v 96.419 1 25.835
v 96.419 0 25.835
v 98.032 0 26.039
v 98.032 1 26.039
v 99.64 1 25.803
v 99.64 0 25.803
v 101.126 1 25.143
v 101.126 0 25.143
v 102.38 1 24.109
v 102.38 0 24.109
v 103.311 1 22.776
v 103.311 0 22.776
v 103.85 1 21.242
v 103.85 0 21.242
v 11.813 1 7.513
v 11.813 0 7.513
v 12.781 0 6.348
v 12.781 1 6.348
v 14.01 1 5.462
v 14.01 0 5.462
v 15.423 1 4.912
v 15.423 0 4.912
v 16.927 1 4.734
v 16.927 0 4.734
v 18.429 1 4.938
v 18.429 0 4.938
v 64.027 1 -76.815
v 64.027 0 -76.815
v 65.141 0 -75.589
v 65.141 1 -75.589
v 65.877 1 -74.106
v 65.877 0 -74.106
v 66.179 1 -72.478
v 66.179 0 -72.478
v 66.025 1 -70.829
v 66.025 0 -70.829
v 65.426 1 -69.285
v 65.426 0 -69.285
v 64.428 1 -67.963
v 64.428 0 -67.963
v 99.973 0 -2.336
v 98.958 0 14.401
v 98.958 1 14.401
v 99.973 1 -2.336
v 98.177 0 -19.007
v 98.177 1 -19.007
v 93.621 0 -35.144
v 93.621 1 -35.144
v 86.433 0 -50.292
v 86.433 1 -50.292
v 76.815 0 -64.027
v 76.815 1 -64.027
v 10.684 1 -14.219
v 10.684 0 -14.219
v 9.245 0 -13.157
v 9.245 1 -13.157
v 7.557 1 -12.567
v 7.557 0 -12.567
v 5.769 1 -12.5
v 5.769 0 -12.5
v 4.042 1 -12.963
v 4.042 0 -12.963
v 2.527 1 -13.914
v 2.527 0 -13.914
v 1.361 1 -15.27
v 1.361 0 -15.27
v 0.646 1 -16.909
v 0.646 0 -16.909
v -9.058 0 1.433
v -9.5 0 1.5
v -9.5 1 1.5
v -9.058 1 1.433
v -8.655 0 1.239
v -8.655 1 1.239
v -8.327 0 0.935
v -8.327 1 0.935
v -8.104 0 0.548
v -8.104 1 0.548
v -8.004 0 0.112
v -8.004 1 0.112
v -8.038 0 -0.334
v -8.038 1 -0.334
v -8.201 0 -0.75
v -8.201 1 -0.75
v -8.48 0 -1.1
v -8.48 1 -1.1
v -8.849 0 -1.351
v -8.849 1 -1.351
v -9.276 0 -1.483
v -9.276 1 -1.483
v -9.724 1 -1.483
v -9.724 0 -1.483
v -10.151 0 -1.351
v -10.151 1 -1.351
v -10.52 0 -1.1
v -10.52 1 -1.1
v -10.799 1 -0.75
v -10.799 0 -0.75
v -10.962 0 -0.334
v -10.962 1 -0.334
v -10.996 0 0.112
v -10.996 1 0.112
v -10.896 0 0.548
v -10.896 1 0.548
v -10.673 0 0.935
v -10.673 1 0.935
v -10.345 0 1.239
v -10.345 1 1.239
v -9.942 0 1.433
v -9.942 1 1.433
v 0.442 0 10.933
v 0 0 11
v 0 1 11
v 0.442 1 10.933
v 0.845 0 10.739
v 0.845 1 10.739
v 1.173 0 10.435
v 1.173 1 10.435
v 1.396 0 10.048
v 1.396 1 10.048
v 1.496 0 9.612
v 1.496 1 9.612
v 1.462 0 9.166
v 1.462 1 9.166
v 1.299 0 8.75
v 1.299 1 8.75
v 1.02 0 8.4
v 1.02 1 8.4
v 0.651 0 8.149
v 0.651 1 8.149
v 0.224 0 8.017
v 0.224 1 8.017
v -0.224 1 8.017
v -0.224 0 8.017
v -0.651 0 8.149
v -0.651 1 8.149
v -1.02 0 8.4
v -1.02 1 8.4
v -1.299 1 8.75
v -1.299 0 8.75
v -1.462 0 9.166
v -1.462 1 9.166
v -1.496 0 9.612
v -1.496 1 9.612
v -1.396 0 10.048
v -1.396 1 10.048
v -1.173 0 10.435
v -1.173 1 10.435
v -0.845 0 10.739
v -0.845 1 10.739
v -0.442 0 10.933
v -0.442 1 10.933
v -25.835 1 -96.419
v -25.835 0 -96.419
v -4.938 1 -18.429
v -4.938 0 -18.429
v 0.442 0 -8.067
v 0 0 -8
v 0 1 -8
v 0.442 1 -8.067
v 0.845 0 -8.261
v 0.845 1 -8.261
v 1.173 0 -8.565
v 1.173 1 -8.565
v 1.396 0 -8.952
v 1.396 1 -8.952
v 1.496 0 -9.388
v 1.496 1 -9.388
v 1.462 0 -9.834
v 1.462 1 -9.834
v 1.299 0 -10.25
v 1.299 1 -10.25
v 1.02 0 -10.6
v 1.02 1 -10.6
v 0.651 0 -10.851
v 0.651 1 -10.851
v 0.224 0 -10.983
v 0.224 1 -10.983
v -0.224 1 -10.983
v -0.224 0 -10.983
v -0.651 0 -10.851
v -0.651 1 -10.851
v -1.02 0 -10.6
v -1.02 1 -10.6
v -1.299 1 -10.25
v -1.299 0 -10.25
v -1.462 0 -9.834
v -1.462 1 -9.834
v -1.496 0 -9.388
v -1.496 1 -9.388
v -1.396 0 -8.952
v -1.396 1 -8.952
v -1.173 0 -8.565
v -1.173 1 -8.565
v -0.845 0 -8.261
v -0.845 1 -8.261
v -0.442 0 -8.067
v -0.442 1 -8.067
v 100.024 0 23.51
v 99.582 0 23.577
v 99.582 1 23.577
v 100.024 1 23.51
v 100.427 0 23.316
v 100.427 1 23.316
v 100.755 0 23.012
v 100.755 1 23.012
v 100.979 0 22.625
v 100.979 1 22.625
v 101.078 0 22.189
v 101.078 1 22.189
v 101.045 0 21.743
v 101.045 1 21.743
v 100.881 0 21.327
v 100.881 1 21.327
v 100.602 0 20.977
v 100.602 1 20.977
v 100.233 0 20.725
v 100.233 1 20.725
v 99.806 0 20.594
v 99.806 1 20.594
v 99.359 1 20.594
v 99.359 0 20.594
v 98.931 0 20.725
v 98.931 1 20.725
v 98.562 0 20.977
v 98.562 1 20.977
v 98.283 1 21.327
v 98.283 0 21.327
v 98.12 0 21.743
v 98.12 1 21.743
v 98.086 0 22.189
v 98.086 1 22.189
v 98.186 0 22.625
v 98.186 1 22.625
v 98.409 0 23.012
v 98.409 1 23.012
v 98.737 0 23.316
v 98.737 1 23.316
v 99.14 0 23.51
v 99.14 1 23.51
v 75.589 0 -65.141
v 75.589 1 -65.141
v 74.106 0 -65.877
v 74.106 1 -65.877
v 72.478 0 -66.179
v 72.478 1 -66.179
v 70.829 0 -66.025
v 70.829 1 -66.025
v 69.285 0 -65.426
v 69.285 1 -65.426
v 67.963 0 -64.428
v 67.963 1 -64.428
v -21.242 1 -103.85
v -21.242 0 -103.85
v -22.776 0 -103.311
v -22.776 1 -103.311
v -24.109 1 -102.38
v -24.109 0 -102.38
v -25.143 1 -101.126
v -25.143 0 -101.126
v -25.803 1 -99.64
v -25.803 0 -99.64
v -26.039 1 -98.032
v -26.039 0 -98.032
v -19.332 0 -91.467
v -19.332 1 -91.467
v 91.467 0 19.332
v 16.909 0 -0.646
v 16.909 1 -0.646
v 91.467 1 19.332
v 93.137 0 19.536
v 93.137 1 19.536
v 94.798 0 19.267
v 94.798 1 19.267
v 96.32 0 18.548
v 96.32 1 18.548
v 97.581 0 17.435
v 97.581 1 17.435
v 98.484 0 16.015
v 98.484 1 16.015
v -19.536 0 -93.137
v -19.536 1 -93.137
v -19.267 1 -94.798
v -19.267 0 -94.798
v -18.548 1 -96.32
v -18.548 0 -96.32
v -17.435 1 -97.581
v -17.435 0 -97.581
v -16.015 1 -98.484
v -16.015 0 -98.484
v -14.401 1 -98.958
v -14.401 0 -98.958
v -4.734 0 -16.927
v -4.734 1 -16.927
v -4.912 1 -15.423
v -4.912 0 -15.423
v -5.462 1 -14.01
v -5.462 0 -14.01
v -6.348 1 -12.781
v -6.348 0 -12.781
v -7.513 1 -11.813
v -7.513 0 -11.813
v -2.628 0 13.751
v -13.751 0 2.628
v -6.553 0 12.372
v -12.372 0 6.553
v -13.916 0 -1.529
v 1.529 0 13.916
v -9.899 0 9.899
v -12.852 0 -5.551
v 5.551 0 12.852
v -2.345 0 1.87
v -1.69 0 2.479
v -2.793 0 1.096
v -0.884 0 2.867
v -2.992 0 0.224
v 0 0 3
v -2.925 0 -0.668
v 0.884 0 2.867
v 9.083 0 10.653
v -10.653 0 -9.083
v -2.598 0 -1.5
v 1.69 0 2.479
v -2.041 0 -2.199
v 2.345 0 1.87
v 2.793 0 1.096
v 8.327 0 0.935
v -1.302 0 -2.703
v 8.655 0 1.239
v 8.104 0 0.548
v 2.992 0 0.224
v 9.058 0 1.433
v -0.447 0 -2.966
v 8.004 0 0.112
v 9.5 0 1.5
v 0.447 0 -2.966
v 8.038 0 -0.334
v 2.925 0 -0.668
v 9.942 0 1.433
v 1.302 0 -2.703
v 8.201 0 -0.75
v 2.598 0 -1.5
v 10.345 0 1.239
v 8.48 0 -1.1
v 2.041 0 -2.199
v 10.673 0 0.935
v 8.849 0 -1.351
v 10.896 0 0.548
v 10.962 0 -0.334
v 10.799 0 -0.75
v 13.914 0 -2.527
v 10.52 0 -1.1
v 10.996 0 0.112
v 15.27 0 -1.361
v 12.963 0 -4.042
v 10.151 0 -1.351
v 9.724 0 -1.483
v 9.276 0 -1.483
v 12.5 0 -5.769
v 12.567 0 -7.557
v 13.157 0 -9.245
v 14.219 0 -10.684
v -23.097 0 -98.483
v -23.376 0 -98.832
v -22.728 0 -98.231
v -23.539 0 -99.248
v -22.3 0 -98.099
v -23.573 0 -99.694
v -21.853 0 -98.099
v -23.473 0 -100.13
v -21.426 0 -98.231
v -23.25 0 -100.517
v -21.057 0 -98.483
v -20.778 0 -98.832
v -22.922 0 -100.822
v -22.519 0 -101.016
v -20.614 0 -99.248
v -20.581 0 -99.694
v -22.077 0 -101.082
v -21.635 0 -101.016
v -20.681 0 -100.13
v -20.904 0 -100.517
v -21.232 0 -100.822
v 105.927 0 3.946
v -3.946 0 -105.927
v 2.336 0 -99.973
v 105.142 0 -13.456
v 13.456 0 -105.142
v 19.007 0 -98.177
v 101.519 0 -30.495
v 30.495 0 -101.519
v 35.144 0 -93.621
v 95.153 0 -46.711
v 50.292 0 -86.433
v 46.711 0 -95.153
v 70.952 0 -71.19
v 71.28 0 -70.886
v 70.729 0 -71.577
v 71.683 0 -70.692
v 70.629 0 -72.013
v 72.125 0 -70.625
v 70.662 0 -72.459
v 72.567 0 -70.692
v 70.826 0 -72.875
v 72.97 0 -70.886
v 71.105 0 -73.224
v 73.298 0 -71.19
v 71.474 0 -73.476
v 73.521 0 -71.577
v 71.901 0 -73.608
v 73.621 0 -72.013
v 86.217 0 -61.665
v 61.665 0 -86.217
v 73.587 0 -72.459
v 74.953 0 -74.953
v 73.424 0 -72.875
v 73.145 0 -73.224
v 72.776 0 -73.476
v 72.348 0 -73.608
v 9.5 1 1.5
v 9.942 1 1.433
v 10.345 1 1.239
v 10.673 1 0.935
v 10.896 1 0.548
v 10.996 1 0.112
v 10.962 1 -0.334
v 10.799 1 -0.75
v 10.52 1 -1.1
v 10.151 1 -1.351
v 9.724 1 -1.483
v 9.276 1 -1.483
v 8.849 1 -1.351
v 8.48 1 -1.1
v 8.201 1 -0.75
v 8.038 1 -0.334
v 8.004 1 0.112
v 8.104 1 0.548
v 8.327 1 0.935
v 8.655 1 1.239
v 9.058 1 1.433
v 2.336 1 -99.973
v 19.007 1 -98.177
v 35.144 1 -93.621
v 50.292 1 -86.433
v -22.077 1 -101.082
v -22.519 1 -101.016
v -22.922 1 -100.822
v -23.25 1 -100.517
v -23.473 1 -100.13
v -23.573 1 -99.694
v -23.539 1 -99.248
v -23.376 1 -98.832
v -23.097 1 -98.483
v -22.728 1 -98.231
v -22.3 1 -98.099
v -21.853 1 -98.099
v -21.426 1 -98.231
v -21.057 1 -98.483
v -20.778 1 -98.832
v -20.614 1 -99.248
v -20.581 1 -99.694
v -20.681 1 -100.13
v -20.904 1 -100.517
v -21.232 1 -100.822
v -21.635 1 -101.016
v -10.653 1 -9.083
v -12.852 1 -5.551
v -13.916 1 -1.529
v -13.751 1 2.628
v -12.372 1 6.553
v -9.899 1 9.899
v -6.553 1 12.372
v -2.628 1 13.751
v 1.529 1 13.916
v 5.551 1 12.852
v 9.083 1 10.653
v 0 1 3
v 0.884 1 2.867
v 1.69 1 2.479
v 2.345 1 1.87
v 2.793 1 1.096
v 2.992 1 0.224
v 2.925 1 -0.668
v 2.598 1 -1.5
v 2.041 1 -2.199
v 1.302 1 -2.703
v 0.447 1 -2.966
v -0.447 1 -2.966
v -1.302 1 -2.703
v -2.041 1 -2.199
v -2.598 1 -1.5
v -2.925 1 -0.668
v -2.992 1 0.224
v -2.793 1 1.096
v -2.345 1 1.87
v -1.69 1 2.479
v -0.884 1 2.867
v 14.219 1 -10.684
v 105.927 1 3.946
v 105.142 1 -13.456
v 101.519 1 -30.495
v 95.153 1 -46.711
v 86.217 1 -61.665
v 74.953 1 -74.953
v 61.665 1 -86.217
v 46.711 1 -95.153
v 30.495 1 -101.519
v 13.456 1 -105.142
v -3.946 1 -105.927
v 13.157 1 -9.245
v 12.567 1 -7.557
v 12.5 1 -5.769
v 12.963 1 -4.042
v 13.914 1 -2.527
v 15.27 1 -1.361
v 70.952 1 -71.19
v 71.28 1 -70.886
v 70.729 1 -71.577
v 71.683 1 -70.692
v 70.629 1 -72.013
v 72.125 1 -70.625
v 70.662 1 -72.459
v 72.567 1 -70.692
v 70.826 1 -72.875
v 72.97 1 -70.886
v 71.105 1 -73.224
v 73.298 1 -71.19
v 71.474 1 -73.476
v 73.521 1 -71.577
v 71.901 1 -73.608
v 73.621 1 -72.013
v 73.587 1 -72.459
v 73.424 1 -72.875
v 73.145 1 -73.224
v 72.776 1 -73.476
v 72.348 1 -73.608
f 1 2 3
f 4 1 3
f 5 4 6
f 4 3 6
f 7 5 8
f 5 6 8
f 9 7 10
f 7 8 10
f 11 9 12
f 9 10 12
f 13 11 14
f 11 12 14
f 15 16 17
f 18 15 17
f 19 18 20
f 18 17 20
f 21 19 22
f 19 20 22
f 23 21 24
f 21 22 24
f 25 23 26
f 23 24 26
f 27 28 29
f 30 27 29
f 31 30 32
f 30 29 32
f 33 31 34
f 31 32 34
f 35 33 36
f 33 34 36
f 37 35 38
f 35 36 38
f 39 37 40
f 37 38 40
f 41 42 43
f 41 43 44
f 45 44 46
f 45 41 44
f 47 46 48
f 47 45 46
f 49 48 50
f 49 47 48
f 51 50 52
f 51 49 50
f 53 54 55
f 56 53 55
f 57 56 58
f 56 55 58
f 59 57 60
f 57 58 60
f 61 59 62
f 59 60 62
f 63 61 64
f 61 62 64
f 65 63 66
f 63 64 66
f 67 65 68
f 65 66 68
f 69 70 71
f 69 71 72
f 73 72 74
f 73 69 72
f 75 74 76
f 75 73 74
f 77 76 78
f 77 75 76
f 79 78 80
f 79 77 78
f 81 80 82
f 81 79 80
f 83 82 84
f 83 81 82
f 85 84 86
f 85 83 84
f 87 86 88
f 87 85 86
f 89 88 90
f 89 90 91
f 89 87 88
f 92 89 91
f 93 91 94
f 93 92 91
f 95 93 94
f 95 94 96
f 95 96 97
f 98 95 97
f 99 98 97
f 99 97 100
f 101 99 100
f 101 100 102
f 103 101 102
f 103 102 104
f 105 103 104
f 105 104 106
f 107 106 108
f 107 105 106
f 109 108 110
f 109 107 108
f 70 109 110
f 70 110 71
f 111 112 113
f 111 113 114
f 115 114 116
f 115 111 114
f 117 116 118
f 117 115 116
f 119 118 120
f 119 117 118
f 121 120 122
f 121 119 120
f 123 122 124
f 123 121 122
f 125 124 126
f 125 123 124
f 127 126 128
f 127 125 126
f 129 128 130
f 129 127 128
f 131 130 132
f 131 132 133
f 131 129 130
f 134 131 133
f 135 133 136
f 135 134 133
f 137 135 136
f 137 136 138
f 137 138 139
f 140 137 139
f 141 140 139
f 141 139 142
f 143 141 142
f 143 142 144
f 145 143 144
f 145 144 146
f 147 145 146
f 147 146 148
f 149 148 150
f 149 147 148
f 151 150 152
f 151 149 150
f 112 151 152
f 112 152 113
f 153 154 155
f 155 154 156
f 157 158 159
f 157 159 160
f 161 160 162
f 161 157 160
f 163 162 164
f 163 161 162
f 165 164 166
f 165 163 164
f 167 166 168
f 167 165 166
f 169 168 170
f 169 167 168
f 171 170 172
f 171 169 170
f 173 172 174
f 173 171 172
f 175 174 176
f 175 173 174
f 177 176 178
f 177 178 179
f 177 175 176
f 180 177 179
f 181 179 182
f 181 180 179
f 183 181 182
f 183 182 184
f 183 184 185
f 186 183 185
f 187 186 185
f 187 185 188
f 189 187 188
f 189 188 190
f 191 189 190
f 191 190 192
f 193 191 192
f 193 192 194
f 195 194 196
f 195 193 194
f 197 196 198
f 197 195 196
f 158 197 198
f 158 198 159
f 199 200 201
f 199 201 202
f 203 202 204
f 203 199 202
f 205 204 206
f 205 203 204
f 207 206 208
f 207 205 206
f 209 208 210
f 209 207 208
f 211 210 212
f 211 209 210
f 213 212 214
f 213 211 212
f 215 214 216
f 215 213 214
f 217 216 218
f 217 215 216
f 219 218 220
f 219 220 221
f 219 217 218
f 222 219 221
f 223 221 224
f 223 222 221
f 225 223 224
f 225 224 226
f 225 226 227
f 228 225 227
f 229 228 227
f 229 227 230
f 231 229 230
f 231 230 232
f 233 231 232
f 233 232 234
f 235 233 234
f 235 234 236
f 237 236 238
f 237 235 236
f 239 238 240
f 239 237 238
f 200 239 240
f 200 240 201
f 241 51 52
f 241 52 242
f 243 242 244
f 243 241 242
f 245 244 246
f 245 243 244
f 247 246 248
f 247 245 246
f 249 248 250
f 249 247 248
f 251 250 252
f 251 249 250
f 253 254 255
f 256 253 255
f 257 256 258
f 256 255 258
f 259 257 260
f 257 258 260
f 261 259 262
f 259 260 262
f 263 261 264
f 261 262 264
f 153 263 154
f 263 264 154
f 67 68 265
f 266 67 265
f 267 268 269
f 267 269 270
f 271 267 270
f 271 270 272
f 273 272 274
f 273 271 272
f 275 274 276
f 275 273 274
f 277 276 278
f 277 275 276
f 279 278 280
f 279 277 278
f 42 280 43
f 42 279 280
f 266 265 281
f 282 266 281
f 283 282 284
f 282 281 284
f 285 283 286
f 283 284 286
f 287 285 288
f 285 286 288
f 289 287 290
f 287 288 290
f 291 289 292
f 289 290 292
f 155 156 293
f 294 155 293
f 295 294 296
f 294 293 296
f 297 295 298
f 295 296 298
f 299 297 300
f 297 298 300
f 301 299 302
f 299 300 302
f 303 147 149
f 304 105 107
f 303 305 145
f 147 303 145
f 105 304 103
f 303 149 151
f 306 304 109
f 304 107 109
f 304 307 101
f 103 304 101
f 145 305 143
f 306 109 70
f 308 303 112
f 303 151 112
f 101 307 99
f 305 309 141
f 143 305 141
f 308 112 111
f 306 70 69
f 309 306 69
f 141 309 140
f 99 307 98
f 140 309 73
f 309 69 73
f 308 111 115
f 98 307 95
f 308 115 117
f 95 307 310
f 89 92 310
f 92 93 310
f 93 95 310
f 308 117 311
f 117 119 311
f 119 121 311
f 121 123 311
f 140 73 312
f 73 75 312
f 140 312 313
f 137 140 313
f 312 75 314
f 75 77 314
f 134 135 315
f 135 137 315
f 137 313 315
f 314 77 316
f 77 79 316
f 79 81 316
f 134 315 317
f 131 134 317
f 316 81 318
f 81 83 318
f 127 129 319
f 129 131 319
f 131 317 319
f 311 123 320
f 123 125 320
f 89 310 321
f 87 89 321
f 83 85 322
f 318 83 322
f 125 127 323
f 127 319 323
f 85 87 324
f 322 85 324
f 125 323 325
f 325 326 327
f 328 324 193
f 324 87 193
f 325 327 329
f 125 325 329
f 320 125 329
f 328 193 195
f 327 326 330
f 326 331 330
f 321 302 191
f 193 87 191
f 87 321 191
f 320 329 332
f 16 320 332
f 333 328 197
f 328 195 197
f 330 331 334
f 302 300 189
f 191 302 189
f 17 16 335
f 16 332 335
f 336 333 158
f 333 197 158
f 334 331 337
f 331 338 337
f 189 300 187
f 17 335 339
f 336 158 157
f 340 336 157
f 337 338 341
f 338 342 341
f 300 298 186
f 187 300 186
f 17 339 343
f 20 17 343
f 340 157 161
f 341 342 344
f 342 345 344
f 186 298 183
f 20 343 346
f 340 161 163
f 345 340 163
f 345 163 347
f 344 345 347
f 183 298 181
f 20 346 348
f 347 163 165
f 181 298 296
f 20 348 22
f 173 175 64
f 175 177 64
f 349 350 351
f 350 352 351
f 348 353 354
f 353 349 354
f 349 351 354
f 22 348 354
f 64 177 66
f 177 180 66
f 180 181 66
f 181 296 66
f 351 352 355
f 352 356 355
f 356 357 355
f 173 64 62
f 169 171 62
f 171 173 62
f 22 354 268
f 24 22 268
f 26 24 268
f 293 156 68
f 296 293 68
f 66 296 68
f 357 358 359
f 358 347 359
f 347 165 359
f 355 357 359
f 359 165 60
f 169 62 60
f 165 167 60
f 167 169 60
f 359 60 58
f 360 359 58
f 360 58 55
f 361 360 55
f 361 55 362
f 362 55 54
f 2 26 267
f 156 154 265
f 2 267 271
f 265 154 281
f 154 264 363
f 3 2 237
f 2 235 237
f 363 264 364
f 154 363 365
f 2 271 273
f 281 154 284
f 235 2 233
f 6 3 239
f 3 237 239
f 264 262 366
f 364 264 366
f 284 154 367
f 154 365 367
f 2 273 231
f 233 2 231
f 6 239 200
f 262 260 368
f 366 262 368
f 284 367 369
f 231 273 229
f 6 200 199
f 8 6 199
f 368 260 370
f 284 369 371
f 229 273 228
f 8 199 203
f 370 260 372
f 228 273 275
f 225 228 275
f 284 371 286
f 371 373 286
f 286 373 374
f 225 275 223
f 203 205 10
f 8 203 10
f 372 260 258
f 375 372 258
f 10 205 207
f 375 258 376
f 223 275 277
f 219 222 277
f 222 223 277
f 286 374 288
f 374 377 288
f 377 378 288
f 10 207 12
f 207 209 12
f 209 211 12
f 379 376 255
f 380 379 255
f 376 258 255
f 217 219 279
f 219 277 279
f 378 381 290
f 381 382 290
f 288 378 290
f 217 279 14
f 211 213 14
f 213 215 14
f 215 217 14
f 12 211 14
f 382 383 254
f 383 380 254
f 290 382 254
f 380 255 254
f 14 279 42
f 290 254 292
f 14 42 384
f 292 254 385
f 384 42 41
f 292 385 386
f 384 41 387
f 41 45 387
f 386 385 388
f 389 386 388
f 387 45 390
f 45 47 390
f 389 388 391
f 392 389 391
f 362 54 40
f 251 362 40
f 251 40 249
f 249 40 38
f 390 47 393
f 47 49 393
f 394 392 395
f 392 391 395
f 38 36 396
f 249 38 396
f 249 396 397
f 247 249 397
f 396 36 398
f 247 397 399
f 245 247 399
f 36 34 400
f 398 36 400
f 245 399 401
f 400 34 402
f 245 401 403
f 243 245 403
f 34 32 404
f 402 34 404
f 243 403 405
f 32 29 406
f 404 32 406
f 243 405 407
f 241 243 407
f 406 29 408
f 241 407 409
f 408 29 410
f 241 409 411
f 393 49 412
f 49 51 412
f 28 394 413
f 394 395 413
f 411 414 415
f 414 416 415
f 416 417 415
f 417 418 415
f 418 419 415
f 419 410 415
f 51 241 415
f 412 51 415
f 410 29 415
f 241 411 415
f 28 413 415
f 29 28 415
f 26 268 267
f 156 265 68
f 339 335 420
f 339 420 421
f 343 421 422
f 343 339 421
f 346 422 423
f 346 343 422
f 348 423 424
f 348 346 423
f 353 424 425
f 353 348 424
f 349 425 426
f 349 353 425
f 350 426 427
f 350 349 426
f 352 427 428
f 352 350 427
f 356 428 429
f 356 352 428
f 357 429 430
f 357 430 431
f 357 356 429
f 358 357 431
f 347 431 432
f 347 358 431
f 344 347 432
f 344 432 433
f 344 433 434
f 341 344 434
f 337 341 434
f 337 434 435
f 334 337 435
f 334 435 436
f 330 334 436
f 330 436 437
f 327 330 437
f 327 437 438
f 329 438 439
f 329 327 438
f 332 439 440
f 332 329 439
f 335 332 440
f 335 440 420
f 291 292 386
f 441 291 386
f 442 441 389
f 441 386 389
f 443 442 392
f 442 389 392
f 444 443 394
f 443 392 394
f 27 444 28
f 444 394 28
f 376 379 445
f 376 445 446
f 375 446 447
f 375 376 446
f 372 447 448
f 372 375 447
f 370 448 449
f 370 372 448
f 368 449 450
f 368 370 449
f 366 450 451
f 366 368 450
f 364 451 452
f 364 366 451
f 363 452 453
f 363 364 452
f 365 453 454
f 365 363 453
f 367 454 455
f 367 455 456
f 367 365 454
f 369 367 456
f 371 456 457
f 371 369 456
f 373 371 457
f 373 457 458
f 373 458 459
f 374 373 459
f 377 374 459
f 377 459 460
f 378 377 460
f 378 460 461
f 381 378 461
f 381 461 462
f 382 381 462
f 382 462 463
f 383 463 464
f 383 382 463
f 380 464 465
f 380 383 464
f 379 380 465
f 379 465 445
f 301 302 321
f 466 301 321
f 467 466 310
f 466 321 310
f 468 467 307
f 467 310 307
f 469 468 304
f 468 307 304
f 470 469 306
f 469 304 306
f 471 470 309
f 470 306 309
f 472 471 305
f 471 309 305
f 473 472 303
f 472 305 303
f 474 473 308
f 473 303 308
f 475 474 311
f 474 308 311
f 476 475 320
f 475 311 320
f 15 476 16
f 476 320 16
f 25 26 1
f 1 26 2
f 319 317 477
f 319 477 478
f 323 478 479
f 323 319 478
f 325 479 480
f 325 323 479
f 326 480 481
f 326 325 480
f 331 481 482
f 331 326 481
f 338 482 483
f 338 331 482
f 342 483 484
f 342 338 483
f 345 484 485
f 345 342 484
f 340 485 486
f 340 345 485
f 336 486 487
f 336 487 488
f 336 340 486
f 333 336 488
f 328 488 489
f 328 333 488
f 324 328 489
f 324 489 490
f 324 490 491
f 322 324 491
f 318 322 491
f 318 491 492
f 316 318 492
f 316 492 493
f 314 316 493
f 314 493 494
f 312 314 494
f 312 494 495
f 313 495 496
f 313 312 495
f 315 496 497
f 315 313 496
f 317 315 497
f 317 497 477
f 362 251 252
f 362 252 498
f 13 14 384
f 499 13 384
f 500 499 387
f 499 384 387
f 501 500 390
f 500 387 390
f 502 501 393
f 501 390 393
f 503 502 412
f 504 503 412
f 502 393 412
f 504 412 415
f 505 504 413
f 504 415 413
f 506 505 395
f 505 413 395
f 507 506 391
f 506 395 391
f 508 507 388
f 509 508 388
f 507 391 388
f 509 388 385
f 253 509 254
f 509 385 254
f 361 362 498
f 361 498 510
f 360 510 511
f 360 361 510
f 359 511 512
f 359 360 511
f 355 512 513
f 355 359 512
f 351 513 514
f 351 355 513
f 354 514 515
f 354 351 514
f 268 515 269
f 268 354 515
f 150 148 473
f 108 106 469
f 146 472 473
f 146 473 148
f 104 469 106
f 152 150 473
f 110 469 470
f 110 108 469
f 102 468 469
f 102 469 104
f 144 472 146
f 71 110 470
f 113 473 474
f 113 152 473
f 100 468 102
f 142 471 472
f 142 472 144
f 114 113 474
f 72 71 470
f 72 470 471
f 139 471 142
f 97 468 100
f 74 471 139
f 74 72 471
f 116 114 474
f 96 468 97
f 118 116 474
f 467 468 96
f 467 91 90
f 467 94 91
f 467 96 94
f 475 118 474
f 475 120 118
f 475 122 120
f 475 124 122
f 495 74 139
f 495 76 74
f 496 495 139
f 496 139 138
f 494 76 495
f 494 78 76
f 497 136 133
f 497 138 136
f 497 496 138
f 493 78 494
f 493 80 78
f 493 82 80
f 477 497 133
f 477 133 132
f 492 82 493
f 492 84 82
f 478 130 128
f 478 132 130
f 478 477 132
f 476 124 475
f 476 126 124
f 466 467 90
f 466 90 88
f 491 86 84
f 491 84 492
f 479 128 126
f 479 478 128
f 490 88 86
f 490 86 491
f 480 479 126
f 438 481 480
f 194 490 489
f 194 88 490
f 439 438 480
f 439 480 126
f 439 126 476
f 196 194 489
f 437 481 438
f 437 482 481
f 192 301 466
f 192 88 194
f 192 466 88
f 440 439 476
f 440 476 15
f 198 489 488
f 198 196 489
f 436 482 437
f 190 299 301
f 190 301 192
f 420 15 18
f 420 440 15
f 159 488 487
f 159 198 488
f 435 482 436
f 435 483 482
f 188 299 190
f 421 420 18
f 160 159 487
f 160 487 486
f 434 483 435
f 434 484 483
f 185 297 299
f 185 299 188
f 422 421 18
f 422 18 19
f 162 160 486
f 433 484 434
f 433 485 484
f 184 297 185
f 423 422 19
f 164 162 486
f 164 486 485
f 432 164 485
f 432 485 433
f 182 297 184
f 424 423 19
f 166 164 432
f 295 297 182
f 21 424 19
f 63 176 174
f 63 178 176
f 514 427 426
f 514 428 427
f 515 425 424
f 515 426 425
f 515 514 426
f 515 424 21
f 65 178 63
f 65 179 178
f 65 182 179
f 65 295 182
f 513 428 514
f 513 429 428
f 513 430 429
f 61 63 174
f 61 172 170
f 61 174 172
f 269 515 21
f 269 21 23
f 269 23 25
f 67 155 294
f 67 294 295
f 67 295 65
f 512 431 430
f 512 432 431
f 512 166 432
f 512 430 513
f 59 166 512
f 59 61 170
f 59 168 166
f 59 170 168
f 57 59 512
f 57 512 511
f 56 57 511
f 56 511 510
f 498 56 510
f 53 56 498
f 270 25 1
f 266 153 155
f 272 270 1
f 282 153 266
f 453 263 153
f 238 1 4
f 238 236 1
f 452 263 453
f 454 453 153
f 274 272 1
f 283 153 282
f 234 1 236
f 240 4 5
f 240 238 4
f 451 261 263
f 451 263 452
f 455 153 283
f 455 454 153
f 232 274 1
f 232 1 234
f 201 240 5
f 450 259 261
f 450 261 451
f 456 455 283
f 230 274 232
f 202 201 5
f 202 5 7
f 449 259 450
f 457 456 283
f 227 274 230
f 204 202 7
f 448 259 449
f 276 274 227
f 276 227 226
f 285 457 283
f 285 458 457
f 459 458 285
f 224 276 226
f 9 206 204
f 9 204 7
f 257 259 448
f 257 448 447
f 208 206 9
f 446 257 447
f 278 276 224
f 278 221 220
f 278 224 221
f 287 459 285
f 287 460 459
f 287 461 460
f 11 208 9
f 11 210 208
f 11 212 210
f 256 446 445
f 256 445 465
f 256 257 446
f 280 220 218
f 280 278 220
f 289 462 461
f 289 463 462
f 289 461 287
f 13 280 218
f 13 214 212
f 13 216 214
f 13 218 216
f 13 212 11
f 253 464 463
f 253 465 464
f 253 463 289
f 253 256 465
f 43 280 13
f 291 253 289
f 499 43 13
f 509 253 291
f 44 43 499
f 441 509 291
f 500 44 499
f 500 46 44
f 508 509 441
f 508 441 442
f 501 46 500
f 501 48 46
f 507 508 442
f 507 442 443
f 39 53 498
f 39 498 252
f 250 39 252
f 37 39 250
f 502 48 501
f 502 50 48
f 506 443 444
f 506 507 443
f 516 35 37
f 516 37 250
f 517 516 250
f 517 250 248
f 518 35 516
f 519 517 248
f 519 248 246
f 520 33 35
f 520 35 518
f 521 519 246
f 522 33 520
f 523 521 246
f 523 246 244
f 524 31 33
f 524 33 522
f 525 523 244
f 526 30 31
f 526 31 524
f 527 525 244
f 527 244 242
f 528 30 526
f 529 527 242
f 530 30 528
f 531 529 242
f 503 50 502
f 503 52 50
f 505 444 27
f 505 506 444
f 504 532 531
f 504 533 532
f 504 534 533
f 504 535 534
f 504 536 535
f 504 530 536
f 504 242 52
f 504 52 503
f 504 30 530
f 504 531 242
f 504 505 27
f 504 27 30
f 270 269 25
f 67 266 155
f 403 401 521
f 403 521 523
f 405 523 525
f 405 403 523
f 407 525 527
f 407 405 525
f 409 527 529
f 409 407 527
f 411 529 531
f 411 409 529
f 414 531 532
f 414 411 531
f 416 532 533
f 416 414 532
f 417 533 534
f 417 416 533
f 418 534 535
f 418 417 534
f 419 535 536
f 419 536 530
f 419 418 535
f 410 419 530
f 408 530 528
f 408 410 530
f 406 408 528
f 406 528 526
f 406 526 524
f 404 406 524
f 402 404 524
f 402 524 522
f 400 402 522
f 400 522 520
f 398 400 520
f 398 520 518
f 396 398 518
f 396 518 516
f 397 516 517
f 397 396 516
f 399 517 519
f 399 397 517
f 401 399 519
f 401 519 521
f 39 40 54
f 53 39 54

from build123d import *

# Parameters (mm, degrees)
SKETCH_1_R      = 1.5
SKETCH_1_R_2    = 3
EXTRUDE_1_DEPTH = 1


with BuildPart() as part:
    # 草图1 → 凸台-拉伸1 (new body)
    with BuildSketch(Plane(origin=(0, 0, 0), x_dir=(1, 0, 0), z_dir=(0, 1, 0))):
        with BuildLine():
            Line((-25.835275078, 96.418559218), (-4.937952664, 18.428690227))
            ThreePointArc((-4.937952664, 18.428690227), (-5.142265363, 14.699078916), (-7.513455335, 11.81304317))
            ThreePointArc((-7.513455335, 11.81304317), (-9.899494937, -9.899494937), (11.81304317, -7.513455335))
            ThreePointArc((11.81304317, -7.513455335), (14.699078916, -5.142265363), (18.428690227, -4.937952664))
            Line((18.428690227, -4.937952664), (96.418559218, -25.835275078))
            ThreePointArc((96.418559218, -25.835275078), (101.126076798, -25.143491075), (103.849761898, -21.242103327))
            ThreePointArc((103.849761898, -21.242103327), (74.953318806, 74.953318806), (-21.242103327, 103.849761898))
            ThreePointArc((-21.242103327, 103.849761898), (-25.143491075, 101.126076798), (-25.835275078, 96.418559218))
        make_face()
        with Locations(Location((0, 9.5, 0), (0, 0, 270))):
            Circle(SKETCH_1_R, mode=Mode.SUBTRACT)
        with Locations(Location((9.5, 0, 0), (0, 0, 270))):
            Circle(SKETCH_1_R, mode=Mode.SUBTRACT)
        with Locations(Location((0, -9.5, 0), (0, 0, 270))):
            Circle(SKETCH_1_R, mode=Mode.SUBTRACT)
        with Locations(Location((-9.5, 0, 0), (0, 0, 270))):
            Circle(SKETCH_1_R, mode=Mode.SUBTRACT)
        with Locations(Location((0, 0, 0), (0, 0, 270))):
            Circle(SKETCH_1_R_2, mode=Mode.SUBTRACT)
        with Locations(Location((72.124891681, 72.124891681, 0), (0, 0, 270))):
            Circle(SKETCH_1_R, mode=Mode.SUBTRACT)
        with Locations(Location((99.582192726, -22.076840622, 0), (0, 0, 270))):
            Circle(SKETCH_1_R, mode=Mode.SUBTRACT)
        with Locations(Location((-22.076840622, 99.582192726, 0), (0, 0, 90))):
            Circle(SKETCH_1_R, mode=Mode.SUBTRACT)
        with BuildLine():
            Line((67.963499444, 64.427965538), (14.219339812, 10.683805906))
            ThreePointArc((14.219339812, 10.683805906), (12.666425541, 4.888250948), (16.909066229, 0.645610261))
            Line((16.909066229, 0.645610261), (91.467293555, -19.33220654))
            ThreePointArc((91.467293555, -19.33220654), (96.31960421, -18.54803697), (98.9576679, -14.400693173))
            ThreePointArc((98.9576679, -14.400693173), (96.237907867, 27.171034013), (76.815042692, 64.026941331))
            ThreePointArc((76.815042692, 64.026941331), (72.477694994, 66.17917653), (67.963499444, 64.427965538))
        make_face(mode=Mode.SUBTRACT)
        with BuildLine():
            Line((64.427965538, 67.963499444), (10.683805906, 14.219339812))
            ThreePointArc((10.683805906, 14.219339812), (4.888250948, 12.666425541), (0.645610261, 16.909066229))
            Line((0.645610261, 16.909066229), (-19.33220654, 91.467293555))
            ThreePointArc((-19.33220654, 91.467293555), (-18.54803697, 96.31960421), (-14.400693173, 98.9576679))
            ThreePointArc((-14.400693173, 98.9576679), (27.171034013, 96.237907867), (64.026941331, 76.815042692))
            ThreePointArc((64.026941331, 76.815042692), (66.17917653, 72.477694994), (64.427965538, 67.963499444))
        make_face(mode=Mode.SUBTRACT)
    extrude(amount=EXTRUDE_1_DEPTH)


solid = part.part
